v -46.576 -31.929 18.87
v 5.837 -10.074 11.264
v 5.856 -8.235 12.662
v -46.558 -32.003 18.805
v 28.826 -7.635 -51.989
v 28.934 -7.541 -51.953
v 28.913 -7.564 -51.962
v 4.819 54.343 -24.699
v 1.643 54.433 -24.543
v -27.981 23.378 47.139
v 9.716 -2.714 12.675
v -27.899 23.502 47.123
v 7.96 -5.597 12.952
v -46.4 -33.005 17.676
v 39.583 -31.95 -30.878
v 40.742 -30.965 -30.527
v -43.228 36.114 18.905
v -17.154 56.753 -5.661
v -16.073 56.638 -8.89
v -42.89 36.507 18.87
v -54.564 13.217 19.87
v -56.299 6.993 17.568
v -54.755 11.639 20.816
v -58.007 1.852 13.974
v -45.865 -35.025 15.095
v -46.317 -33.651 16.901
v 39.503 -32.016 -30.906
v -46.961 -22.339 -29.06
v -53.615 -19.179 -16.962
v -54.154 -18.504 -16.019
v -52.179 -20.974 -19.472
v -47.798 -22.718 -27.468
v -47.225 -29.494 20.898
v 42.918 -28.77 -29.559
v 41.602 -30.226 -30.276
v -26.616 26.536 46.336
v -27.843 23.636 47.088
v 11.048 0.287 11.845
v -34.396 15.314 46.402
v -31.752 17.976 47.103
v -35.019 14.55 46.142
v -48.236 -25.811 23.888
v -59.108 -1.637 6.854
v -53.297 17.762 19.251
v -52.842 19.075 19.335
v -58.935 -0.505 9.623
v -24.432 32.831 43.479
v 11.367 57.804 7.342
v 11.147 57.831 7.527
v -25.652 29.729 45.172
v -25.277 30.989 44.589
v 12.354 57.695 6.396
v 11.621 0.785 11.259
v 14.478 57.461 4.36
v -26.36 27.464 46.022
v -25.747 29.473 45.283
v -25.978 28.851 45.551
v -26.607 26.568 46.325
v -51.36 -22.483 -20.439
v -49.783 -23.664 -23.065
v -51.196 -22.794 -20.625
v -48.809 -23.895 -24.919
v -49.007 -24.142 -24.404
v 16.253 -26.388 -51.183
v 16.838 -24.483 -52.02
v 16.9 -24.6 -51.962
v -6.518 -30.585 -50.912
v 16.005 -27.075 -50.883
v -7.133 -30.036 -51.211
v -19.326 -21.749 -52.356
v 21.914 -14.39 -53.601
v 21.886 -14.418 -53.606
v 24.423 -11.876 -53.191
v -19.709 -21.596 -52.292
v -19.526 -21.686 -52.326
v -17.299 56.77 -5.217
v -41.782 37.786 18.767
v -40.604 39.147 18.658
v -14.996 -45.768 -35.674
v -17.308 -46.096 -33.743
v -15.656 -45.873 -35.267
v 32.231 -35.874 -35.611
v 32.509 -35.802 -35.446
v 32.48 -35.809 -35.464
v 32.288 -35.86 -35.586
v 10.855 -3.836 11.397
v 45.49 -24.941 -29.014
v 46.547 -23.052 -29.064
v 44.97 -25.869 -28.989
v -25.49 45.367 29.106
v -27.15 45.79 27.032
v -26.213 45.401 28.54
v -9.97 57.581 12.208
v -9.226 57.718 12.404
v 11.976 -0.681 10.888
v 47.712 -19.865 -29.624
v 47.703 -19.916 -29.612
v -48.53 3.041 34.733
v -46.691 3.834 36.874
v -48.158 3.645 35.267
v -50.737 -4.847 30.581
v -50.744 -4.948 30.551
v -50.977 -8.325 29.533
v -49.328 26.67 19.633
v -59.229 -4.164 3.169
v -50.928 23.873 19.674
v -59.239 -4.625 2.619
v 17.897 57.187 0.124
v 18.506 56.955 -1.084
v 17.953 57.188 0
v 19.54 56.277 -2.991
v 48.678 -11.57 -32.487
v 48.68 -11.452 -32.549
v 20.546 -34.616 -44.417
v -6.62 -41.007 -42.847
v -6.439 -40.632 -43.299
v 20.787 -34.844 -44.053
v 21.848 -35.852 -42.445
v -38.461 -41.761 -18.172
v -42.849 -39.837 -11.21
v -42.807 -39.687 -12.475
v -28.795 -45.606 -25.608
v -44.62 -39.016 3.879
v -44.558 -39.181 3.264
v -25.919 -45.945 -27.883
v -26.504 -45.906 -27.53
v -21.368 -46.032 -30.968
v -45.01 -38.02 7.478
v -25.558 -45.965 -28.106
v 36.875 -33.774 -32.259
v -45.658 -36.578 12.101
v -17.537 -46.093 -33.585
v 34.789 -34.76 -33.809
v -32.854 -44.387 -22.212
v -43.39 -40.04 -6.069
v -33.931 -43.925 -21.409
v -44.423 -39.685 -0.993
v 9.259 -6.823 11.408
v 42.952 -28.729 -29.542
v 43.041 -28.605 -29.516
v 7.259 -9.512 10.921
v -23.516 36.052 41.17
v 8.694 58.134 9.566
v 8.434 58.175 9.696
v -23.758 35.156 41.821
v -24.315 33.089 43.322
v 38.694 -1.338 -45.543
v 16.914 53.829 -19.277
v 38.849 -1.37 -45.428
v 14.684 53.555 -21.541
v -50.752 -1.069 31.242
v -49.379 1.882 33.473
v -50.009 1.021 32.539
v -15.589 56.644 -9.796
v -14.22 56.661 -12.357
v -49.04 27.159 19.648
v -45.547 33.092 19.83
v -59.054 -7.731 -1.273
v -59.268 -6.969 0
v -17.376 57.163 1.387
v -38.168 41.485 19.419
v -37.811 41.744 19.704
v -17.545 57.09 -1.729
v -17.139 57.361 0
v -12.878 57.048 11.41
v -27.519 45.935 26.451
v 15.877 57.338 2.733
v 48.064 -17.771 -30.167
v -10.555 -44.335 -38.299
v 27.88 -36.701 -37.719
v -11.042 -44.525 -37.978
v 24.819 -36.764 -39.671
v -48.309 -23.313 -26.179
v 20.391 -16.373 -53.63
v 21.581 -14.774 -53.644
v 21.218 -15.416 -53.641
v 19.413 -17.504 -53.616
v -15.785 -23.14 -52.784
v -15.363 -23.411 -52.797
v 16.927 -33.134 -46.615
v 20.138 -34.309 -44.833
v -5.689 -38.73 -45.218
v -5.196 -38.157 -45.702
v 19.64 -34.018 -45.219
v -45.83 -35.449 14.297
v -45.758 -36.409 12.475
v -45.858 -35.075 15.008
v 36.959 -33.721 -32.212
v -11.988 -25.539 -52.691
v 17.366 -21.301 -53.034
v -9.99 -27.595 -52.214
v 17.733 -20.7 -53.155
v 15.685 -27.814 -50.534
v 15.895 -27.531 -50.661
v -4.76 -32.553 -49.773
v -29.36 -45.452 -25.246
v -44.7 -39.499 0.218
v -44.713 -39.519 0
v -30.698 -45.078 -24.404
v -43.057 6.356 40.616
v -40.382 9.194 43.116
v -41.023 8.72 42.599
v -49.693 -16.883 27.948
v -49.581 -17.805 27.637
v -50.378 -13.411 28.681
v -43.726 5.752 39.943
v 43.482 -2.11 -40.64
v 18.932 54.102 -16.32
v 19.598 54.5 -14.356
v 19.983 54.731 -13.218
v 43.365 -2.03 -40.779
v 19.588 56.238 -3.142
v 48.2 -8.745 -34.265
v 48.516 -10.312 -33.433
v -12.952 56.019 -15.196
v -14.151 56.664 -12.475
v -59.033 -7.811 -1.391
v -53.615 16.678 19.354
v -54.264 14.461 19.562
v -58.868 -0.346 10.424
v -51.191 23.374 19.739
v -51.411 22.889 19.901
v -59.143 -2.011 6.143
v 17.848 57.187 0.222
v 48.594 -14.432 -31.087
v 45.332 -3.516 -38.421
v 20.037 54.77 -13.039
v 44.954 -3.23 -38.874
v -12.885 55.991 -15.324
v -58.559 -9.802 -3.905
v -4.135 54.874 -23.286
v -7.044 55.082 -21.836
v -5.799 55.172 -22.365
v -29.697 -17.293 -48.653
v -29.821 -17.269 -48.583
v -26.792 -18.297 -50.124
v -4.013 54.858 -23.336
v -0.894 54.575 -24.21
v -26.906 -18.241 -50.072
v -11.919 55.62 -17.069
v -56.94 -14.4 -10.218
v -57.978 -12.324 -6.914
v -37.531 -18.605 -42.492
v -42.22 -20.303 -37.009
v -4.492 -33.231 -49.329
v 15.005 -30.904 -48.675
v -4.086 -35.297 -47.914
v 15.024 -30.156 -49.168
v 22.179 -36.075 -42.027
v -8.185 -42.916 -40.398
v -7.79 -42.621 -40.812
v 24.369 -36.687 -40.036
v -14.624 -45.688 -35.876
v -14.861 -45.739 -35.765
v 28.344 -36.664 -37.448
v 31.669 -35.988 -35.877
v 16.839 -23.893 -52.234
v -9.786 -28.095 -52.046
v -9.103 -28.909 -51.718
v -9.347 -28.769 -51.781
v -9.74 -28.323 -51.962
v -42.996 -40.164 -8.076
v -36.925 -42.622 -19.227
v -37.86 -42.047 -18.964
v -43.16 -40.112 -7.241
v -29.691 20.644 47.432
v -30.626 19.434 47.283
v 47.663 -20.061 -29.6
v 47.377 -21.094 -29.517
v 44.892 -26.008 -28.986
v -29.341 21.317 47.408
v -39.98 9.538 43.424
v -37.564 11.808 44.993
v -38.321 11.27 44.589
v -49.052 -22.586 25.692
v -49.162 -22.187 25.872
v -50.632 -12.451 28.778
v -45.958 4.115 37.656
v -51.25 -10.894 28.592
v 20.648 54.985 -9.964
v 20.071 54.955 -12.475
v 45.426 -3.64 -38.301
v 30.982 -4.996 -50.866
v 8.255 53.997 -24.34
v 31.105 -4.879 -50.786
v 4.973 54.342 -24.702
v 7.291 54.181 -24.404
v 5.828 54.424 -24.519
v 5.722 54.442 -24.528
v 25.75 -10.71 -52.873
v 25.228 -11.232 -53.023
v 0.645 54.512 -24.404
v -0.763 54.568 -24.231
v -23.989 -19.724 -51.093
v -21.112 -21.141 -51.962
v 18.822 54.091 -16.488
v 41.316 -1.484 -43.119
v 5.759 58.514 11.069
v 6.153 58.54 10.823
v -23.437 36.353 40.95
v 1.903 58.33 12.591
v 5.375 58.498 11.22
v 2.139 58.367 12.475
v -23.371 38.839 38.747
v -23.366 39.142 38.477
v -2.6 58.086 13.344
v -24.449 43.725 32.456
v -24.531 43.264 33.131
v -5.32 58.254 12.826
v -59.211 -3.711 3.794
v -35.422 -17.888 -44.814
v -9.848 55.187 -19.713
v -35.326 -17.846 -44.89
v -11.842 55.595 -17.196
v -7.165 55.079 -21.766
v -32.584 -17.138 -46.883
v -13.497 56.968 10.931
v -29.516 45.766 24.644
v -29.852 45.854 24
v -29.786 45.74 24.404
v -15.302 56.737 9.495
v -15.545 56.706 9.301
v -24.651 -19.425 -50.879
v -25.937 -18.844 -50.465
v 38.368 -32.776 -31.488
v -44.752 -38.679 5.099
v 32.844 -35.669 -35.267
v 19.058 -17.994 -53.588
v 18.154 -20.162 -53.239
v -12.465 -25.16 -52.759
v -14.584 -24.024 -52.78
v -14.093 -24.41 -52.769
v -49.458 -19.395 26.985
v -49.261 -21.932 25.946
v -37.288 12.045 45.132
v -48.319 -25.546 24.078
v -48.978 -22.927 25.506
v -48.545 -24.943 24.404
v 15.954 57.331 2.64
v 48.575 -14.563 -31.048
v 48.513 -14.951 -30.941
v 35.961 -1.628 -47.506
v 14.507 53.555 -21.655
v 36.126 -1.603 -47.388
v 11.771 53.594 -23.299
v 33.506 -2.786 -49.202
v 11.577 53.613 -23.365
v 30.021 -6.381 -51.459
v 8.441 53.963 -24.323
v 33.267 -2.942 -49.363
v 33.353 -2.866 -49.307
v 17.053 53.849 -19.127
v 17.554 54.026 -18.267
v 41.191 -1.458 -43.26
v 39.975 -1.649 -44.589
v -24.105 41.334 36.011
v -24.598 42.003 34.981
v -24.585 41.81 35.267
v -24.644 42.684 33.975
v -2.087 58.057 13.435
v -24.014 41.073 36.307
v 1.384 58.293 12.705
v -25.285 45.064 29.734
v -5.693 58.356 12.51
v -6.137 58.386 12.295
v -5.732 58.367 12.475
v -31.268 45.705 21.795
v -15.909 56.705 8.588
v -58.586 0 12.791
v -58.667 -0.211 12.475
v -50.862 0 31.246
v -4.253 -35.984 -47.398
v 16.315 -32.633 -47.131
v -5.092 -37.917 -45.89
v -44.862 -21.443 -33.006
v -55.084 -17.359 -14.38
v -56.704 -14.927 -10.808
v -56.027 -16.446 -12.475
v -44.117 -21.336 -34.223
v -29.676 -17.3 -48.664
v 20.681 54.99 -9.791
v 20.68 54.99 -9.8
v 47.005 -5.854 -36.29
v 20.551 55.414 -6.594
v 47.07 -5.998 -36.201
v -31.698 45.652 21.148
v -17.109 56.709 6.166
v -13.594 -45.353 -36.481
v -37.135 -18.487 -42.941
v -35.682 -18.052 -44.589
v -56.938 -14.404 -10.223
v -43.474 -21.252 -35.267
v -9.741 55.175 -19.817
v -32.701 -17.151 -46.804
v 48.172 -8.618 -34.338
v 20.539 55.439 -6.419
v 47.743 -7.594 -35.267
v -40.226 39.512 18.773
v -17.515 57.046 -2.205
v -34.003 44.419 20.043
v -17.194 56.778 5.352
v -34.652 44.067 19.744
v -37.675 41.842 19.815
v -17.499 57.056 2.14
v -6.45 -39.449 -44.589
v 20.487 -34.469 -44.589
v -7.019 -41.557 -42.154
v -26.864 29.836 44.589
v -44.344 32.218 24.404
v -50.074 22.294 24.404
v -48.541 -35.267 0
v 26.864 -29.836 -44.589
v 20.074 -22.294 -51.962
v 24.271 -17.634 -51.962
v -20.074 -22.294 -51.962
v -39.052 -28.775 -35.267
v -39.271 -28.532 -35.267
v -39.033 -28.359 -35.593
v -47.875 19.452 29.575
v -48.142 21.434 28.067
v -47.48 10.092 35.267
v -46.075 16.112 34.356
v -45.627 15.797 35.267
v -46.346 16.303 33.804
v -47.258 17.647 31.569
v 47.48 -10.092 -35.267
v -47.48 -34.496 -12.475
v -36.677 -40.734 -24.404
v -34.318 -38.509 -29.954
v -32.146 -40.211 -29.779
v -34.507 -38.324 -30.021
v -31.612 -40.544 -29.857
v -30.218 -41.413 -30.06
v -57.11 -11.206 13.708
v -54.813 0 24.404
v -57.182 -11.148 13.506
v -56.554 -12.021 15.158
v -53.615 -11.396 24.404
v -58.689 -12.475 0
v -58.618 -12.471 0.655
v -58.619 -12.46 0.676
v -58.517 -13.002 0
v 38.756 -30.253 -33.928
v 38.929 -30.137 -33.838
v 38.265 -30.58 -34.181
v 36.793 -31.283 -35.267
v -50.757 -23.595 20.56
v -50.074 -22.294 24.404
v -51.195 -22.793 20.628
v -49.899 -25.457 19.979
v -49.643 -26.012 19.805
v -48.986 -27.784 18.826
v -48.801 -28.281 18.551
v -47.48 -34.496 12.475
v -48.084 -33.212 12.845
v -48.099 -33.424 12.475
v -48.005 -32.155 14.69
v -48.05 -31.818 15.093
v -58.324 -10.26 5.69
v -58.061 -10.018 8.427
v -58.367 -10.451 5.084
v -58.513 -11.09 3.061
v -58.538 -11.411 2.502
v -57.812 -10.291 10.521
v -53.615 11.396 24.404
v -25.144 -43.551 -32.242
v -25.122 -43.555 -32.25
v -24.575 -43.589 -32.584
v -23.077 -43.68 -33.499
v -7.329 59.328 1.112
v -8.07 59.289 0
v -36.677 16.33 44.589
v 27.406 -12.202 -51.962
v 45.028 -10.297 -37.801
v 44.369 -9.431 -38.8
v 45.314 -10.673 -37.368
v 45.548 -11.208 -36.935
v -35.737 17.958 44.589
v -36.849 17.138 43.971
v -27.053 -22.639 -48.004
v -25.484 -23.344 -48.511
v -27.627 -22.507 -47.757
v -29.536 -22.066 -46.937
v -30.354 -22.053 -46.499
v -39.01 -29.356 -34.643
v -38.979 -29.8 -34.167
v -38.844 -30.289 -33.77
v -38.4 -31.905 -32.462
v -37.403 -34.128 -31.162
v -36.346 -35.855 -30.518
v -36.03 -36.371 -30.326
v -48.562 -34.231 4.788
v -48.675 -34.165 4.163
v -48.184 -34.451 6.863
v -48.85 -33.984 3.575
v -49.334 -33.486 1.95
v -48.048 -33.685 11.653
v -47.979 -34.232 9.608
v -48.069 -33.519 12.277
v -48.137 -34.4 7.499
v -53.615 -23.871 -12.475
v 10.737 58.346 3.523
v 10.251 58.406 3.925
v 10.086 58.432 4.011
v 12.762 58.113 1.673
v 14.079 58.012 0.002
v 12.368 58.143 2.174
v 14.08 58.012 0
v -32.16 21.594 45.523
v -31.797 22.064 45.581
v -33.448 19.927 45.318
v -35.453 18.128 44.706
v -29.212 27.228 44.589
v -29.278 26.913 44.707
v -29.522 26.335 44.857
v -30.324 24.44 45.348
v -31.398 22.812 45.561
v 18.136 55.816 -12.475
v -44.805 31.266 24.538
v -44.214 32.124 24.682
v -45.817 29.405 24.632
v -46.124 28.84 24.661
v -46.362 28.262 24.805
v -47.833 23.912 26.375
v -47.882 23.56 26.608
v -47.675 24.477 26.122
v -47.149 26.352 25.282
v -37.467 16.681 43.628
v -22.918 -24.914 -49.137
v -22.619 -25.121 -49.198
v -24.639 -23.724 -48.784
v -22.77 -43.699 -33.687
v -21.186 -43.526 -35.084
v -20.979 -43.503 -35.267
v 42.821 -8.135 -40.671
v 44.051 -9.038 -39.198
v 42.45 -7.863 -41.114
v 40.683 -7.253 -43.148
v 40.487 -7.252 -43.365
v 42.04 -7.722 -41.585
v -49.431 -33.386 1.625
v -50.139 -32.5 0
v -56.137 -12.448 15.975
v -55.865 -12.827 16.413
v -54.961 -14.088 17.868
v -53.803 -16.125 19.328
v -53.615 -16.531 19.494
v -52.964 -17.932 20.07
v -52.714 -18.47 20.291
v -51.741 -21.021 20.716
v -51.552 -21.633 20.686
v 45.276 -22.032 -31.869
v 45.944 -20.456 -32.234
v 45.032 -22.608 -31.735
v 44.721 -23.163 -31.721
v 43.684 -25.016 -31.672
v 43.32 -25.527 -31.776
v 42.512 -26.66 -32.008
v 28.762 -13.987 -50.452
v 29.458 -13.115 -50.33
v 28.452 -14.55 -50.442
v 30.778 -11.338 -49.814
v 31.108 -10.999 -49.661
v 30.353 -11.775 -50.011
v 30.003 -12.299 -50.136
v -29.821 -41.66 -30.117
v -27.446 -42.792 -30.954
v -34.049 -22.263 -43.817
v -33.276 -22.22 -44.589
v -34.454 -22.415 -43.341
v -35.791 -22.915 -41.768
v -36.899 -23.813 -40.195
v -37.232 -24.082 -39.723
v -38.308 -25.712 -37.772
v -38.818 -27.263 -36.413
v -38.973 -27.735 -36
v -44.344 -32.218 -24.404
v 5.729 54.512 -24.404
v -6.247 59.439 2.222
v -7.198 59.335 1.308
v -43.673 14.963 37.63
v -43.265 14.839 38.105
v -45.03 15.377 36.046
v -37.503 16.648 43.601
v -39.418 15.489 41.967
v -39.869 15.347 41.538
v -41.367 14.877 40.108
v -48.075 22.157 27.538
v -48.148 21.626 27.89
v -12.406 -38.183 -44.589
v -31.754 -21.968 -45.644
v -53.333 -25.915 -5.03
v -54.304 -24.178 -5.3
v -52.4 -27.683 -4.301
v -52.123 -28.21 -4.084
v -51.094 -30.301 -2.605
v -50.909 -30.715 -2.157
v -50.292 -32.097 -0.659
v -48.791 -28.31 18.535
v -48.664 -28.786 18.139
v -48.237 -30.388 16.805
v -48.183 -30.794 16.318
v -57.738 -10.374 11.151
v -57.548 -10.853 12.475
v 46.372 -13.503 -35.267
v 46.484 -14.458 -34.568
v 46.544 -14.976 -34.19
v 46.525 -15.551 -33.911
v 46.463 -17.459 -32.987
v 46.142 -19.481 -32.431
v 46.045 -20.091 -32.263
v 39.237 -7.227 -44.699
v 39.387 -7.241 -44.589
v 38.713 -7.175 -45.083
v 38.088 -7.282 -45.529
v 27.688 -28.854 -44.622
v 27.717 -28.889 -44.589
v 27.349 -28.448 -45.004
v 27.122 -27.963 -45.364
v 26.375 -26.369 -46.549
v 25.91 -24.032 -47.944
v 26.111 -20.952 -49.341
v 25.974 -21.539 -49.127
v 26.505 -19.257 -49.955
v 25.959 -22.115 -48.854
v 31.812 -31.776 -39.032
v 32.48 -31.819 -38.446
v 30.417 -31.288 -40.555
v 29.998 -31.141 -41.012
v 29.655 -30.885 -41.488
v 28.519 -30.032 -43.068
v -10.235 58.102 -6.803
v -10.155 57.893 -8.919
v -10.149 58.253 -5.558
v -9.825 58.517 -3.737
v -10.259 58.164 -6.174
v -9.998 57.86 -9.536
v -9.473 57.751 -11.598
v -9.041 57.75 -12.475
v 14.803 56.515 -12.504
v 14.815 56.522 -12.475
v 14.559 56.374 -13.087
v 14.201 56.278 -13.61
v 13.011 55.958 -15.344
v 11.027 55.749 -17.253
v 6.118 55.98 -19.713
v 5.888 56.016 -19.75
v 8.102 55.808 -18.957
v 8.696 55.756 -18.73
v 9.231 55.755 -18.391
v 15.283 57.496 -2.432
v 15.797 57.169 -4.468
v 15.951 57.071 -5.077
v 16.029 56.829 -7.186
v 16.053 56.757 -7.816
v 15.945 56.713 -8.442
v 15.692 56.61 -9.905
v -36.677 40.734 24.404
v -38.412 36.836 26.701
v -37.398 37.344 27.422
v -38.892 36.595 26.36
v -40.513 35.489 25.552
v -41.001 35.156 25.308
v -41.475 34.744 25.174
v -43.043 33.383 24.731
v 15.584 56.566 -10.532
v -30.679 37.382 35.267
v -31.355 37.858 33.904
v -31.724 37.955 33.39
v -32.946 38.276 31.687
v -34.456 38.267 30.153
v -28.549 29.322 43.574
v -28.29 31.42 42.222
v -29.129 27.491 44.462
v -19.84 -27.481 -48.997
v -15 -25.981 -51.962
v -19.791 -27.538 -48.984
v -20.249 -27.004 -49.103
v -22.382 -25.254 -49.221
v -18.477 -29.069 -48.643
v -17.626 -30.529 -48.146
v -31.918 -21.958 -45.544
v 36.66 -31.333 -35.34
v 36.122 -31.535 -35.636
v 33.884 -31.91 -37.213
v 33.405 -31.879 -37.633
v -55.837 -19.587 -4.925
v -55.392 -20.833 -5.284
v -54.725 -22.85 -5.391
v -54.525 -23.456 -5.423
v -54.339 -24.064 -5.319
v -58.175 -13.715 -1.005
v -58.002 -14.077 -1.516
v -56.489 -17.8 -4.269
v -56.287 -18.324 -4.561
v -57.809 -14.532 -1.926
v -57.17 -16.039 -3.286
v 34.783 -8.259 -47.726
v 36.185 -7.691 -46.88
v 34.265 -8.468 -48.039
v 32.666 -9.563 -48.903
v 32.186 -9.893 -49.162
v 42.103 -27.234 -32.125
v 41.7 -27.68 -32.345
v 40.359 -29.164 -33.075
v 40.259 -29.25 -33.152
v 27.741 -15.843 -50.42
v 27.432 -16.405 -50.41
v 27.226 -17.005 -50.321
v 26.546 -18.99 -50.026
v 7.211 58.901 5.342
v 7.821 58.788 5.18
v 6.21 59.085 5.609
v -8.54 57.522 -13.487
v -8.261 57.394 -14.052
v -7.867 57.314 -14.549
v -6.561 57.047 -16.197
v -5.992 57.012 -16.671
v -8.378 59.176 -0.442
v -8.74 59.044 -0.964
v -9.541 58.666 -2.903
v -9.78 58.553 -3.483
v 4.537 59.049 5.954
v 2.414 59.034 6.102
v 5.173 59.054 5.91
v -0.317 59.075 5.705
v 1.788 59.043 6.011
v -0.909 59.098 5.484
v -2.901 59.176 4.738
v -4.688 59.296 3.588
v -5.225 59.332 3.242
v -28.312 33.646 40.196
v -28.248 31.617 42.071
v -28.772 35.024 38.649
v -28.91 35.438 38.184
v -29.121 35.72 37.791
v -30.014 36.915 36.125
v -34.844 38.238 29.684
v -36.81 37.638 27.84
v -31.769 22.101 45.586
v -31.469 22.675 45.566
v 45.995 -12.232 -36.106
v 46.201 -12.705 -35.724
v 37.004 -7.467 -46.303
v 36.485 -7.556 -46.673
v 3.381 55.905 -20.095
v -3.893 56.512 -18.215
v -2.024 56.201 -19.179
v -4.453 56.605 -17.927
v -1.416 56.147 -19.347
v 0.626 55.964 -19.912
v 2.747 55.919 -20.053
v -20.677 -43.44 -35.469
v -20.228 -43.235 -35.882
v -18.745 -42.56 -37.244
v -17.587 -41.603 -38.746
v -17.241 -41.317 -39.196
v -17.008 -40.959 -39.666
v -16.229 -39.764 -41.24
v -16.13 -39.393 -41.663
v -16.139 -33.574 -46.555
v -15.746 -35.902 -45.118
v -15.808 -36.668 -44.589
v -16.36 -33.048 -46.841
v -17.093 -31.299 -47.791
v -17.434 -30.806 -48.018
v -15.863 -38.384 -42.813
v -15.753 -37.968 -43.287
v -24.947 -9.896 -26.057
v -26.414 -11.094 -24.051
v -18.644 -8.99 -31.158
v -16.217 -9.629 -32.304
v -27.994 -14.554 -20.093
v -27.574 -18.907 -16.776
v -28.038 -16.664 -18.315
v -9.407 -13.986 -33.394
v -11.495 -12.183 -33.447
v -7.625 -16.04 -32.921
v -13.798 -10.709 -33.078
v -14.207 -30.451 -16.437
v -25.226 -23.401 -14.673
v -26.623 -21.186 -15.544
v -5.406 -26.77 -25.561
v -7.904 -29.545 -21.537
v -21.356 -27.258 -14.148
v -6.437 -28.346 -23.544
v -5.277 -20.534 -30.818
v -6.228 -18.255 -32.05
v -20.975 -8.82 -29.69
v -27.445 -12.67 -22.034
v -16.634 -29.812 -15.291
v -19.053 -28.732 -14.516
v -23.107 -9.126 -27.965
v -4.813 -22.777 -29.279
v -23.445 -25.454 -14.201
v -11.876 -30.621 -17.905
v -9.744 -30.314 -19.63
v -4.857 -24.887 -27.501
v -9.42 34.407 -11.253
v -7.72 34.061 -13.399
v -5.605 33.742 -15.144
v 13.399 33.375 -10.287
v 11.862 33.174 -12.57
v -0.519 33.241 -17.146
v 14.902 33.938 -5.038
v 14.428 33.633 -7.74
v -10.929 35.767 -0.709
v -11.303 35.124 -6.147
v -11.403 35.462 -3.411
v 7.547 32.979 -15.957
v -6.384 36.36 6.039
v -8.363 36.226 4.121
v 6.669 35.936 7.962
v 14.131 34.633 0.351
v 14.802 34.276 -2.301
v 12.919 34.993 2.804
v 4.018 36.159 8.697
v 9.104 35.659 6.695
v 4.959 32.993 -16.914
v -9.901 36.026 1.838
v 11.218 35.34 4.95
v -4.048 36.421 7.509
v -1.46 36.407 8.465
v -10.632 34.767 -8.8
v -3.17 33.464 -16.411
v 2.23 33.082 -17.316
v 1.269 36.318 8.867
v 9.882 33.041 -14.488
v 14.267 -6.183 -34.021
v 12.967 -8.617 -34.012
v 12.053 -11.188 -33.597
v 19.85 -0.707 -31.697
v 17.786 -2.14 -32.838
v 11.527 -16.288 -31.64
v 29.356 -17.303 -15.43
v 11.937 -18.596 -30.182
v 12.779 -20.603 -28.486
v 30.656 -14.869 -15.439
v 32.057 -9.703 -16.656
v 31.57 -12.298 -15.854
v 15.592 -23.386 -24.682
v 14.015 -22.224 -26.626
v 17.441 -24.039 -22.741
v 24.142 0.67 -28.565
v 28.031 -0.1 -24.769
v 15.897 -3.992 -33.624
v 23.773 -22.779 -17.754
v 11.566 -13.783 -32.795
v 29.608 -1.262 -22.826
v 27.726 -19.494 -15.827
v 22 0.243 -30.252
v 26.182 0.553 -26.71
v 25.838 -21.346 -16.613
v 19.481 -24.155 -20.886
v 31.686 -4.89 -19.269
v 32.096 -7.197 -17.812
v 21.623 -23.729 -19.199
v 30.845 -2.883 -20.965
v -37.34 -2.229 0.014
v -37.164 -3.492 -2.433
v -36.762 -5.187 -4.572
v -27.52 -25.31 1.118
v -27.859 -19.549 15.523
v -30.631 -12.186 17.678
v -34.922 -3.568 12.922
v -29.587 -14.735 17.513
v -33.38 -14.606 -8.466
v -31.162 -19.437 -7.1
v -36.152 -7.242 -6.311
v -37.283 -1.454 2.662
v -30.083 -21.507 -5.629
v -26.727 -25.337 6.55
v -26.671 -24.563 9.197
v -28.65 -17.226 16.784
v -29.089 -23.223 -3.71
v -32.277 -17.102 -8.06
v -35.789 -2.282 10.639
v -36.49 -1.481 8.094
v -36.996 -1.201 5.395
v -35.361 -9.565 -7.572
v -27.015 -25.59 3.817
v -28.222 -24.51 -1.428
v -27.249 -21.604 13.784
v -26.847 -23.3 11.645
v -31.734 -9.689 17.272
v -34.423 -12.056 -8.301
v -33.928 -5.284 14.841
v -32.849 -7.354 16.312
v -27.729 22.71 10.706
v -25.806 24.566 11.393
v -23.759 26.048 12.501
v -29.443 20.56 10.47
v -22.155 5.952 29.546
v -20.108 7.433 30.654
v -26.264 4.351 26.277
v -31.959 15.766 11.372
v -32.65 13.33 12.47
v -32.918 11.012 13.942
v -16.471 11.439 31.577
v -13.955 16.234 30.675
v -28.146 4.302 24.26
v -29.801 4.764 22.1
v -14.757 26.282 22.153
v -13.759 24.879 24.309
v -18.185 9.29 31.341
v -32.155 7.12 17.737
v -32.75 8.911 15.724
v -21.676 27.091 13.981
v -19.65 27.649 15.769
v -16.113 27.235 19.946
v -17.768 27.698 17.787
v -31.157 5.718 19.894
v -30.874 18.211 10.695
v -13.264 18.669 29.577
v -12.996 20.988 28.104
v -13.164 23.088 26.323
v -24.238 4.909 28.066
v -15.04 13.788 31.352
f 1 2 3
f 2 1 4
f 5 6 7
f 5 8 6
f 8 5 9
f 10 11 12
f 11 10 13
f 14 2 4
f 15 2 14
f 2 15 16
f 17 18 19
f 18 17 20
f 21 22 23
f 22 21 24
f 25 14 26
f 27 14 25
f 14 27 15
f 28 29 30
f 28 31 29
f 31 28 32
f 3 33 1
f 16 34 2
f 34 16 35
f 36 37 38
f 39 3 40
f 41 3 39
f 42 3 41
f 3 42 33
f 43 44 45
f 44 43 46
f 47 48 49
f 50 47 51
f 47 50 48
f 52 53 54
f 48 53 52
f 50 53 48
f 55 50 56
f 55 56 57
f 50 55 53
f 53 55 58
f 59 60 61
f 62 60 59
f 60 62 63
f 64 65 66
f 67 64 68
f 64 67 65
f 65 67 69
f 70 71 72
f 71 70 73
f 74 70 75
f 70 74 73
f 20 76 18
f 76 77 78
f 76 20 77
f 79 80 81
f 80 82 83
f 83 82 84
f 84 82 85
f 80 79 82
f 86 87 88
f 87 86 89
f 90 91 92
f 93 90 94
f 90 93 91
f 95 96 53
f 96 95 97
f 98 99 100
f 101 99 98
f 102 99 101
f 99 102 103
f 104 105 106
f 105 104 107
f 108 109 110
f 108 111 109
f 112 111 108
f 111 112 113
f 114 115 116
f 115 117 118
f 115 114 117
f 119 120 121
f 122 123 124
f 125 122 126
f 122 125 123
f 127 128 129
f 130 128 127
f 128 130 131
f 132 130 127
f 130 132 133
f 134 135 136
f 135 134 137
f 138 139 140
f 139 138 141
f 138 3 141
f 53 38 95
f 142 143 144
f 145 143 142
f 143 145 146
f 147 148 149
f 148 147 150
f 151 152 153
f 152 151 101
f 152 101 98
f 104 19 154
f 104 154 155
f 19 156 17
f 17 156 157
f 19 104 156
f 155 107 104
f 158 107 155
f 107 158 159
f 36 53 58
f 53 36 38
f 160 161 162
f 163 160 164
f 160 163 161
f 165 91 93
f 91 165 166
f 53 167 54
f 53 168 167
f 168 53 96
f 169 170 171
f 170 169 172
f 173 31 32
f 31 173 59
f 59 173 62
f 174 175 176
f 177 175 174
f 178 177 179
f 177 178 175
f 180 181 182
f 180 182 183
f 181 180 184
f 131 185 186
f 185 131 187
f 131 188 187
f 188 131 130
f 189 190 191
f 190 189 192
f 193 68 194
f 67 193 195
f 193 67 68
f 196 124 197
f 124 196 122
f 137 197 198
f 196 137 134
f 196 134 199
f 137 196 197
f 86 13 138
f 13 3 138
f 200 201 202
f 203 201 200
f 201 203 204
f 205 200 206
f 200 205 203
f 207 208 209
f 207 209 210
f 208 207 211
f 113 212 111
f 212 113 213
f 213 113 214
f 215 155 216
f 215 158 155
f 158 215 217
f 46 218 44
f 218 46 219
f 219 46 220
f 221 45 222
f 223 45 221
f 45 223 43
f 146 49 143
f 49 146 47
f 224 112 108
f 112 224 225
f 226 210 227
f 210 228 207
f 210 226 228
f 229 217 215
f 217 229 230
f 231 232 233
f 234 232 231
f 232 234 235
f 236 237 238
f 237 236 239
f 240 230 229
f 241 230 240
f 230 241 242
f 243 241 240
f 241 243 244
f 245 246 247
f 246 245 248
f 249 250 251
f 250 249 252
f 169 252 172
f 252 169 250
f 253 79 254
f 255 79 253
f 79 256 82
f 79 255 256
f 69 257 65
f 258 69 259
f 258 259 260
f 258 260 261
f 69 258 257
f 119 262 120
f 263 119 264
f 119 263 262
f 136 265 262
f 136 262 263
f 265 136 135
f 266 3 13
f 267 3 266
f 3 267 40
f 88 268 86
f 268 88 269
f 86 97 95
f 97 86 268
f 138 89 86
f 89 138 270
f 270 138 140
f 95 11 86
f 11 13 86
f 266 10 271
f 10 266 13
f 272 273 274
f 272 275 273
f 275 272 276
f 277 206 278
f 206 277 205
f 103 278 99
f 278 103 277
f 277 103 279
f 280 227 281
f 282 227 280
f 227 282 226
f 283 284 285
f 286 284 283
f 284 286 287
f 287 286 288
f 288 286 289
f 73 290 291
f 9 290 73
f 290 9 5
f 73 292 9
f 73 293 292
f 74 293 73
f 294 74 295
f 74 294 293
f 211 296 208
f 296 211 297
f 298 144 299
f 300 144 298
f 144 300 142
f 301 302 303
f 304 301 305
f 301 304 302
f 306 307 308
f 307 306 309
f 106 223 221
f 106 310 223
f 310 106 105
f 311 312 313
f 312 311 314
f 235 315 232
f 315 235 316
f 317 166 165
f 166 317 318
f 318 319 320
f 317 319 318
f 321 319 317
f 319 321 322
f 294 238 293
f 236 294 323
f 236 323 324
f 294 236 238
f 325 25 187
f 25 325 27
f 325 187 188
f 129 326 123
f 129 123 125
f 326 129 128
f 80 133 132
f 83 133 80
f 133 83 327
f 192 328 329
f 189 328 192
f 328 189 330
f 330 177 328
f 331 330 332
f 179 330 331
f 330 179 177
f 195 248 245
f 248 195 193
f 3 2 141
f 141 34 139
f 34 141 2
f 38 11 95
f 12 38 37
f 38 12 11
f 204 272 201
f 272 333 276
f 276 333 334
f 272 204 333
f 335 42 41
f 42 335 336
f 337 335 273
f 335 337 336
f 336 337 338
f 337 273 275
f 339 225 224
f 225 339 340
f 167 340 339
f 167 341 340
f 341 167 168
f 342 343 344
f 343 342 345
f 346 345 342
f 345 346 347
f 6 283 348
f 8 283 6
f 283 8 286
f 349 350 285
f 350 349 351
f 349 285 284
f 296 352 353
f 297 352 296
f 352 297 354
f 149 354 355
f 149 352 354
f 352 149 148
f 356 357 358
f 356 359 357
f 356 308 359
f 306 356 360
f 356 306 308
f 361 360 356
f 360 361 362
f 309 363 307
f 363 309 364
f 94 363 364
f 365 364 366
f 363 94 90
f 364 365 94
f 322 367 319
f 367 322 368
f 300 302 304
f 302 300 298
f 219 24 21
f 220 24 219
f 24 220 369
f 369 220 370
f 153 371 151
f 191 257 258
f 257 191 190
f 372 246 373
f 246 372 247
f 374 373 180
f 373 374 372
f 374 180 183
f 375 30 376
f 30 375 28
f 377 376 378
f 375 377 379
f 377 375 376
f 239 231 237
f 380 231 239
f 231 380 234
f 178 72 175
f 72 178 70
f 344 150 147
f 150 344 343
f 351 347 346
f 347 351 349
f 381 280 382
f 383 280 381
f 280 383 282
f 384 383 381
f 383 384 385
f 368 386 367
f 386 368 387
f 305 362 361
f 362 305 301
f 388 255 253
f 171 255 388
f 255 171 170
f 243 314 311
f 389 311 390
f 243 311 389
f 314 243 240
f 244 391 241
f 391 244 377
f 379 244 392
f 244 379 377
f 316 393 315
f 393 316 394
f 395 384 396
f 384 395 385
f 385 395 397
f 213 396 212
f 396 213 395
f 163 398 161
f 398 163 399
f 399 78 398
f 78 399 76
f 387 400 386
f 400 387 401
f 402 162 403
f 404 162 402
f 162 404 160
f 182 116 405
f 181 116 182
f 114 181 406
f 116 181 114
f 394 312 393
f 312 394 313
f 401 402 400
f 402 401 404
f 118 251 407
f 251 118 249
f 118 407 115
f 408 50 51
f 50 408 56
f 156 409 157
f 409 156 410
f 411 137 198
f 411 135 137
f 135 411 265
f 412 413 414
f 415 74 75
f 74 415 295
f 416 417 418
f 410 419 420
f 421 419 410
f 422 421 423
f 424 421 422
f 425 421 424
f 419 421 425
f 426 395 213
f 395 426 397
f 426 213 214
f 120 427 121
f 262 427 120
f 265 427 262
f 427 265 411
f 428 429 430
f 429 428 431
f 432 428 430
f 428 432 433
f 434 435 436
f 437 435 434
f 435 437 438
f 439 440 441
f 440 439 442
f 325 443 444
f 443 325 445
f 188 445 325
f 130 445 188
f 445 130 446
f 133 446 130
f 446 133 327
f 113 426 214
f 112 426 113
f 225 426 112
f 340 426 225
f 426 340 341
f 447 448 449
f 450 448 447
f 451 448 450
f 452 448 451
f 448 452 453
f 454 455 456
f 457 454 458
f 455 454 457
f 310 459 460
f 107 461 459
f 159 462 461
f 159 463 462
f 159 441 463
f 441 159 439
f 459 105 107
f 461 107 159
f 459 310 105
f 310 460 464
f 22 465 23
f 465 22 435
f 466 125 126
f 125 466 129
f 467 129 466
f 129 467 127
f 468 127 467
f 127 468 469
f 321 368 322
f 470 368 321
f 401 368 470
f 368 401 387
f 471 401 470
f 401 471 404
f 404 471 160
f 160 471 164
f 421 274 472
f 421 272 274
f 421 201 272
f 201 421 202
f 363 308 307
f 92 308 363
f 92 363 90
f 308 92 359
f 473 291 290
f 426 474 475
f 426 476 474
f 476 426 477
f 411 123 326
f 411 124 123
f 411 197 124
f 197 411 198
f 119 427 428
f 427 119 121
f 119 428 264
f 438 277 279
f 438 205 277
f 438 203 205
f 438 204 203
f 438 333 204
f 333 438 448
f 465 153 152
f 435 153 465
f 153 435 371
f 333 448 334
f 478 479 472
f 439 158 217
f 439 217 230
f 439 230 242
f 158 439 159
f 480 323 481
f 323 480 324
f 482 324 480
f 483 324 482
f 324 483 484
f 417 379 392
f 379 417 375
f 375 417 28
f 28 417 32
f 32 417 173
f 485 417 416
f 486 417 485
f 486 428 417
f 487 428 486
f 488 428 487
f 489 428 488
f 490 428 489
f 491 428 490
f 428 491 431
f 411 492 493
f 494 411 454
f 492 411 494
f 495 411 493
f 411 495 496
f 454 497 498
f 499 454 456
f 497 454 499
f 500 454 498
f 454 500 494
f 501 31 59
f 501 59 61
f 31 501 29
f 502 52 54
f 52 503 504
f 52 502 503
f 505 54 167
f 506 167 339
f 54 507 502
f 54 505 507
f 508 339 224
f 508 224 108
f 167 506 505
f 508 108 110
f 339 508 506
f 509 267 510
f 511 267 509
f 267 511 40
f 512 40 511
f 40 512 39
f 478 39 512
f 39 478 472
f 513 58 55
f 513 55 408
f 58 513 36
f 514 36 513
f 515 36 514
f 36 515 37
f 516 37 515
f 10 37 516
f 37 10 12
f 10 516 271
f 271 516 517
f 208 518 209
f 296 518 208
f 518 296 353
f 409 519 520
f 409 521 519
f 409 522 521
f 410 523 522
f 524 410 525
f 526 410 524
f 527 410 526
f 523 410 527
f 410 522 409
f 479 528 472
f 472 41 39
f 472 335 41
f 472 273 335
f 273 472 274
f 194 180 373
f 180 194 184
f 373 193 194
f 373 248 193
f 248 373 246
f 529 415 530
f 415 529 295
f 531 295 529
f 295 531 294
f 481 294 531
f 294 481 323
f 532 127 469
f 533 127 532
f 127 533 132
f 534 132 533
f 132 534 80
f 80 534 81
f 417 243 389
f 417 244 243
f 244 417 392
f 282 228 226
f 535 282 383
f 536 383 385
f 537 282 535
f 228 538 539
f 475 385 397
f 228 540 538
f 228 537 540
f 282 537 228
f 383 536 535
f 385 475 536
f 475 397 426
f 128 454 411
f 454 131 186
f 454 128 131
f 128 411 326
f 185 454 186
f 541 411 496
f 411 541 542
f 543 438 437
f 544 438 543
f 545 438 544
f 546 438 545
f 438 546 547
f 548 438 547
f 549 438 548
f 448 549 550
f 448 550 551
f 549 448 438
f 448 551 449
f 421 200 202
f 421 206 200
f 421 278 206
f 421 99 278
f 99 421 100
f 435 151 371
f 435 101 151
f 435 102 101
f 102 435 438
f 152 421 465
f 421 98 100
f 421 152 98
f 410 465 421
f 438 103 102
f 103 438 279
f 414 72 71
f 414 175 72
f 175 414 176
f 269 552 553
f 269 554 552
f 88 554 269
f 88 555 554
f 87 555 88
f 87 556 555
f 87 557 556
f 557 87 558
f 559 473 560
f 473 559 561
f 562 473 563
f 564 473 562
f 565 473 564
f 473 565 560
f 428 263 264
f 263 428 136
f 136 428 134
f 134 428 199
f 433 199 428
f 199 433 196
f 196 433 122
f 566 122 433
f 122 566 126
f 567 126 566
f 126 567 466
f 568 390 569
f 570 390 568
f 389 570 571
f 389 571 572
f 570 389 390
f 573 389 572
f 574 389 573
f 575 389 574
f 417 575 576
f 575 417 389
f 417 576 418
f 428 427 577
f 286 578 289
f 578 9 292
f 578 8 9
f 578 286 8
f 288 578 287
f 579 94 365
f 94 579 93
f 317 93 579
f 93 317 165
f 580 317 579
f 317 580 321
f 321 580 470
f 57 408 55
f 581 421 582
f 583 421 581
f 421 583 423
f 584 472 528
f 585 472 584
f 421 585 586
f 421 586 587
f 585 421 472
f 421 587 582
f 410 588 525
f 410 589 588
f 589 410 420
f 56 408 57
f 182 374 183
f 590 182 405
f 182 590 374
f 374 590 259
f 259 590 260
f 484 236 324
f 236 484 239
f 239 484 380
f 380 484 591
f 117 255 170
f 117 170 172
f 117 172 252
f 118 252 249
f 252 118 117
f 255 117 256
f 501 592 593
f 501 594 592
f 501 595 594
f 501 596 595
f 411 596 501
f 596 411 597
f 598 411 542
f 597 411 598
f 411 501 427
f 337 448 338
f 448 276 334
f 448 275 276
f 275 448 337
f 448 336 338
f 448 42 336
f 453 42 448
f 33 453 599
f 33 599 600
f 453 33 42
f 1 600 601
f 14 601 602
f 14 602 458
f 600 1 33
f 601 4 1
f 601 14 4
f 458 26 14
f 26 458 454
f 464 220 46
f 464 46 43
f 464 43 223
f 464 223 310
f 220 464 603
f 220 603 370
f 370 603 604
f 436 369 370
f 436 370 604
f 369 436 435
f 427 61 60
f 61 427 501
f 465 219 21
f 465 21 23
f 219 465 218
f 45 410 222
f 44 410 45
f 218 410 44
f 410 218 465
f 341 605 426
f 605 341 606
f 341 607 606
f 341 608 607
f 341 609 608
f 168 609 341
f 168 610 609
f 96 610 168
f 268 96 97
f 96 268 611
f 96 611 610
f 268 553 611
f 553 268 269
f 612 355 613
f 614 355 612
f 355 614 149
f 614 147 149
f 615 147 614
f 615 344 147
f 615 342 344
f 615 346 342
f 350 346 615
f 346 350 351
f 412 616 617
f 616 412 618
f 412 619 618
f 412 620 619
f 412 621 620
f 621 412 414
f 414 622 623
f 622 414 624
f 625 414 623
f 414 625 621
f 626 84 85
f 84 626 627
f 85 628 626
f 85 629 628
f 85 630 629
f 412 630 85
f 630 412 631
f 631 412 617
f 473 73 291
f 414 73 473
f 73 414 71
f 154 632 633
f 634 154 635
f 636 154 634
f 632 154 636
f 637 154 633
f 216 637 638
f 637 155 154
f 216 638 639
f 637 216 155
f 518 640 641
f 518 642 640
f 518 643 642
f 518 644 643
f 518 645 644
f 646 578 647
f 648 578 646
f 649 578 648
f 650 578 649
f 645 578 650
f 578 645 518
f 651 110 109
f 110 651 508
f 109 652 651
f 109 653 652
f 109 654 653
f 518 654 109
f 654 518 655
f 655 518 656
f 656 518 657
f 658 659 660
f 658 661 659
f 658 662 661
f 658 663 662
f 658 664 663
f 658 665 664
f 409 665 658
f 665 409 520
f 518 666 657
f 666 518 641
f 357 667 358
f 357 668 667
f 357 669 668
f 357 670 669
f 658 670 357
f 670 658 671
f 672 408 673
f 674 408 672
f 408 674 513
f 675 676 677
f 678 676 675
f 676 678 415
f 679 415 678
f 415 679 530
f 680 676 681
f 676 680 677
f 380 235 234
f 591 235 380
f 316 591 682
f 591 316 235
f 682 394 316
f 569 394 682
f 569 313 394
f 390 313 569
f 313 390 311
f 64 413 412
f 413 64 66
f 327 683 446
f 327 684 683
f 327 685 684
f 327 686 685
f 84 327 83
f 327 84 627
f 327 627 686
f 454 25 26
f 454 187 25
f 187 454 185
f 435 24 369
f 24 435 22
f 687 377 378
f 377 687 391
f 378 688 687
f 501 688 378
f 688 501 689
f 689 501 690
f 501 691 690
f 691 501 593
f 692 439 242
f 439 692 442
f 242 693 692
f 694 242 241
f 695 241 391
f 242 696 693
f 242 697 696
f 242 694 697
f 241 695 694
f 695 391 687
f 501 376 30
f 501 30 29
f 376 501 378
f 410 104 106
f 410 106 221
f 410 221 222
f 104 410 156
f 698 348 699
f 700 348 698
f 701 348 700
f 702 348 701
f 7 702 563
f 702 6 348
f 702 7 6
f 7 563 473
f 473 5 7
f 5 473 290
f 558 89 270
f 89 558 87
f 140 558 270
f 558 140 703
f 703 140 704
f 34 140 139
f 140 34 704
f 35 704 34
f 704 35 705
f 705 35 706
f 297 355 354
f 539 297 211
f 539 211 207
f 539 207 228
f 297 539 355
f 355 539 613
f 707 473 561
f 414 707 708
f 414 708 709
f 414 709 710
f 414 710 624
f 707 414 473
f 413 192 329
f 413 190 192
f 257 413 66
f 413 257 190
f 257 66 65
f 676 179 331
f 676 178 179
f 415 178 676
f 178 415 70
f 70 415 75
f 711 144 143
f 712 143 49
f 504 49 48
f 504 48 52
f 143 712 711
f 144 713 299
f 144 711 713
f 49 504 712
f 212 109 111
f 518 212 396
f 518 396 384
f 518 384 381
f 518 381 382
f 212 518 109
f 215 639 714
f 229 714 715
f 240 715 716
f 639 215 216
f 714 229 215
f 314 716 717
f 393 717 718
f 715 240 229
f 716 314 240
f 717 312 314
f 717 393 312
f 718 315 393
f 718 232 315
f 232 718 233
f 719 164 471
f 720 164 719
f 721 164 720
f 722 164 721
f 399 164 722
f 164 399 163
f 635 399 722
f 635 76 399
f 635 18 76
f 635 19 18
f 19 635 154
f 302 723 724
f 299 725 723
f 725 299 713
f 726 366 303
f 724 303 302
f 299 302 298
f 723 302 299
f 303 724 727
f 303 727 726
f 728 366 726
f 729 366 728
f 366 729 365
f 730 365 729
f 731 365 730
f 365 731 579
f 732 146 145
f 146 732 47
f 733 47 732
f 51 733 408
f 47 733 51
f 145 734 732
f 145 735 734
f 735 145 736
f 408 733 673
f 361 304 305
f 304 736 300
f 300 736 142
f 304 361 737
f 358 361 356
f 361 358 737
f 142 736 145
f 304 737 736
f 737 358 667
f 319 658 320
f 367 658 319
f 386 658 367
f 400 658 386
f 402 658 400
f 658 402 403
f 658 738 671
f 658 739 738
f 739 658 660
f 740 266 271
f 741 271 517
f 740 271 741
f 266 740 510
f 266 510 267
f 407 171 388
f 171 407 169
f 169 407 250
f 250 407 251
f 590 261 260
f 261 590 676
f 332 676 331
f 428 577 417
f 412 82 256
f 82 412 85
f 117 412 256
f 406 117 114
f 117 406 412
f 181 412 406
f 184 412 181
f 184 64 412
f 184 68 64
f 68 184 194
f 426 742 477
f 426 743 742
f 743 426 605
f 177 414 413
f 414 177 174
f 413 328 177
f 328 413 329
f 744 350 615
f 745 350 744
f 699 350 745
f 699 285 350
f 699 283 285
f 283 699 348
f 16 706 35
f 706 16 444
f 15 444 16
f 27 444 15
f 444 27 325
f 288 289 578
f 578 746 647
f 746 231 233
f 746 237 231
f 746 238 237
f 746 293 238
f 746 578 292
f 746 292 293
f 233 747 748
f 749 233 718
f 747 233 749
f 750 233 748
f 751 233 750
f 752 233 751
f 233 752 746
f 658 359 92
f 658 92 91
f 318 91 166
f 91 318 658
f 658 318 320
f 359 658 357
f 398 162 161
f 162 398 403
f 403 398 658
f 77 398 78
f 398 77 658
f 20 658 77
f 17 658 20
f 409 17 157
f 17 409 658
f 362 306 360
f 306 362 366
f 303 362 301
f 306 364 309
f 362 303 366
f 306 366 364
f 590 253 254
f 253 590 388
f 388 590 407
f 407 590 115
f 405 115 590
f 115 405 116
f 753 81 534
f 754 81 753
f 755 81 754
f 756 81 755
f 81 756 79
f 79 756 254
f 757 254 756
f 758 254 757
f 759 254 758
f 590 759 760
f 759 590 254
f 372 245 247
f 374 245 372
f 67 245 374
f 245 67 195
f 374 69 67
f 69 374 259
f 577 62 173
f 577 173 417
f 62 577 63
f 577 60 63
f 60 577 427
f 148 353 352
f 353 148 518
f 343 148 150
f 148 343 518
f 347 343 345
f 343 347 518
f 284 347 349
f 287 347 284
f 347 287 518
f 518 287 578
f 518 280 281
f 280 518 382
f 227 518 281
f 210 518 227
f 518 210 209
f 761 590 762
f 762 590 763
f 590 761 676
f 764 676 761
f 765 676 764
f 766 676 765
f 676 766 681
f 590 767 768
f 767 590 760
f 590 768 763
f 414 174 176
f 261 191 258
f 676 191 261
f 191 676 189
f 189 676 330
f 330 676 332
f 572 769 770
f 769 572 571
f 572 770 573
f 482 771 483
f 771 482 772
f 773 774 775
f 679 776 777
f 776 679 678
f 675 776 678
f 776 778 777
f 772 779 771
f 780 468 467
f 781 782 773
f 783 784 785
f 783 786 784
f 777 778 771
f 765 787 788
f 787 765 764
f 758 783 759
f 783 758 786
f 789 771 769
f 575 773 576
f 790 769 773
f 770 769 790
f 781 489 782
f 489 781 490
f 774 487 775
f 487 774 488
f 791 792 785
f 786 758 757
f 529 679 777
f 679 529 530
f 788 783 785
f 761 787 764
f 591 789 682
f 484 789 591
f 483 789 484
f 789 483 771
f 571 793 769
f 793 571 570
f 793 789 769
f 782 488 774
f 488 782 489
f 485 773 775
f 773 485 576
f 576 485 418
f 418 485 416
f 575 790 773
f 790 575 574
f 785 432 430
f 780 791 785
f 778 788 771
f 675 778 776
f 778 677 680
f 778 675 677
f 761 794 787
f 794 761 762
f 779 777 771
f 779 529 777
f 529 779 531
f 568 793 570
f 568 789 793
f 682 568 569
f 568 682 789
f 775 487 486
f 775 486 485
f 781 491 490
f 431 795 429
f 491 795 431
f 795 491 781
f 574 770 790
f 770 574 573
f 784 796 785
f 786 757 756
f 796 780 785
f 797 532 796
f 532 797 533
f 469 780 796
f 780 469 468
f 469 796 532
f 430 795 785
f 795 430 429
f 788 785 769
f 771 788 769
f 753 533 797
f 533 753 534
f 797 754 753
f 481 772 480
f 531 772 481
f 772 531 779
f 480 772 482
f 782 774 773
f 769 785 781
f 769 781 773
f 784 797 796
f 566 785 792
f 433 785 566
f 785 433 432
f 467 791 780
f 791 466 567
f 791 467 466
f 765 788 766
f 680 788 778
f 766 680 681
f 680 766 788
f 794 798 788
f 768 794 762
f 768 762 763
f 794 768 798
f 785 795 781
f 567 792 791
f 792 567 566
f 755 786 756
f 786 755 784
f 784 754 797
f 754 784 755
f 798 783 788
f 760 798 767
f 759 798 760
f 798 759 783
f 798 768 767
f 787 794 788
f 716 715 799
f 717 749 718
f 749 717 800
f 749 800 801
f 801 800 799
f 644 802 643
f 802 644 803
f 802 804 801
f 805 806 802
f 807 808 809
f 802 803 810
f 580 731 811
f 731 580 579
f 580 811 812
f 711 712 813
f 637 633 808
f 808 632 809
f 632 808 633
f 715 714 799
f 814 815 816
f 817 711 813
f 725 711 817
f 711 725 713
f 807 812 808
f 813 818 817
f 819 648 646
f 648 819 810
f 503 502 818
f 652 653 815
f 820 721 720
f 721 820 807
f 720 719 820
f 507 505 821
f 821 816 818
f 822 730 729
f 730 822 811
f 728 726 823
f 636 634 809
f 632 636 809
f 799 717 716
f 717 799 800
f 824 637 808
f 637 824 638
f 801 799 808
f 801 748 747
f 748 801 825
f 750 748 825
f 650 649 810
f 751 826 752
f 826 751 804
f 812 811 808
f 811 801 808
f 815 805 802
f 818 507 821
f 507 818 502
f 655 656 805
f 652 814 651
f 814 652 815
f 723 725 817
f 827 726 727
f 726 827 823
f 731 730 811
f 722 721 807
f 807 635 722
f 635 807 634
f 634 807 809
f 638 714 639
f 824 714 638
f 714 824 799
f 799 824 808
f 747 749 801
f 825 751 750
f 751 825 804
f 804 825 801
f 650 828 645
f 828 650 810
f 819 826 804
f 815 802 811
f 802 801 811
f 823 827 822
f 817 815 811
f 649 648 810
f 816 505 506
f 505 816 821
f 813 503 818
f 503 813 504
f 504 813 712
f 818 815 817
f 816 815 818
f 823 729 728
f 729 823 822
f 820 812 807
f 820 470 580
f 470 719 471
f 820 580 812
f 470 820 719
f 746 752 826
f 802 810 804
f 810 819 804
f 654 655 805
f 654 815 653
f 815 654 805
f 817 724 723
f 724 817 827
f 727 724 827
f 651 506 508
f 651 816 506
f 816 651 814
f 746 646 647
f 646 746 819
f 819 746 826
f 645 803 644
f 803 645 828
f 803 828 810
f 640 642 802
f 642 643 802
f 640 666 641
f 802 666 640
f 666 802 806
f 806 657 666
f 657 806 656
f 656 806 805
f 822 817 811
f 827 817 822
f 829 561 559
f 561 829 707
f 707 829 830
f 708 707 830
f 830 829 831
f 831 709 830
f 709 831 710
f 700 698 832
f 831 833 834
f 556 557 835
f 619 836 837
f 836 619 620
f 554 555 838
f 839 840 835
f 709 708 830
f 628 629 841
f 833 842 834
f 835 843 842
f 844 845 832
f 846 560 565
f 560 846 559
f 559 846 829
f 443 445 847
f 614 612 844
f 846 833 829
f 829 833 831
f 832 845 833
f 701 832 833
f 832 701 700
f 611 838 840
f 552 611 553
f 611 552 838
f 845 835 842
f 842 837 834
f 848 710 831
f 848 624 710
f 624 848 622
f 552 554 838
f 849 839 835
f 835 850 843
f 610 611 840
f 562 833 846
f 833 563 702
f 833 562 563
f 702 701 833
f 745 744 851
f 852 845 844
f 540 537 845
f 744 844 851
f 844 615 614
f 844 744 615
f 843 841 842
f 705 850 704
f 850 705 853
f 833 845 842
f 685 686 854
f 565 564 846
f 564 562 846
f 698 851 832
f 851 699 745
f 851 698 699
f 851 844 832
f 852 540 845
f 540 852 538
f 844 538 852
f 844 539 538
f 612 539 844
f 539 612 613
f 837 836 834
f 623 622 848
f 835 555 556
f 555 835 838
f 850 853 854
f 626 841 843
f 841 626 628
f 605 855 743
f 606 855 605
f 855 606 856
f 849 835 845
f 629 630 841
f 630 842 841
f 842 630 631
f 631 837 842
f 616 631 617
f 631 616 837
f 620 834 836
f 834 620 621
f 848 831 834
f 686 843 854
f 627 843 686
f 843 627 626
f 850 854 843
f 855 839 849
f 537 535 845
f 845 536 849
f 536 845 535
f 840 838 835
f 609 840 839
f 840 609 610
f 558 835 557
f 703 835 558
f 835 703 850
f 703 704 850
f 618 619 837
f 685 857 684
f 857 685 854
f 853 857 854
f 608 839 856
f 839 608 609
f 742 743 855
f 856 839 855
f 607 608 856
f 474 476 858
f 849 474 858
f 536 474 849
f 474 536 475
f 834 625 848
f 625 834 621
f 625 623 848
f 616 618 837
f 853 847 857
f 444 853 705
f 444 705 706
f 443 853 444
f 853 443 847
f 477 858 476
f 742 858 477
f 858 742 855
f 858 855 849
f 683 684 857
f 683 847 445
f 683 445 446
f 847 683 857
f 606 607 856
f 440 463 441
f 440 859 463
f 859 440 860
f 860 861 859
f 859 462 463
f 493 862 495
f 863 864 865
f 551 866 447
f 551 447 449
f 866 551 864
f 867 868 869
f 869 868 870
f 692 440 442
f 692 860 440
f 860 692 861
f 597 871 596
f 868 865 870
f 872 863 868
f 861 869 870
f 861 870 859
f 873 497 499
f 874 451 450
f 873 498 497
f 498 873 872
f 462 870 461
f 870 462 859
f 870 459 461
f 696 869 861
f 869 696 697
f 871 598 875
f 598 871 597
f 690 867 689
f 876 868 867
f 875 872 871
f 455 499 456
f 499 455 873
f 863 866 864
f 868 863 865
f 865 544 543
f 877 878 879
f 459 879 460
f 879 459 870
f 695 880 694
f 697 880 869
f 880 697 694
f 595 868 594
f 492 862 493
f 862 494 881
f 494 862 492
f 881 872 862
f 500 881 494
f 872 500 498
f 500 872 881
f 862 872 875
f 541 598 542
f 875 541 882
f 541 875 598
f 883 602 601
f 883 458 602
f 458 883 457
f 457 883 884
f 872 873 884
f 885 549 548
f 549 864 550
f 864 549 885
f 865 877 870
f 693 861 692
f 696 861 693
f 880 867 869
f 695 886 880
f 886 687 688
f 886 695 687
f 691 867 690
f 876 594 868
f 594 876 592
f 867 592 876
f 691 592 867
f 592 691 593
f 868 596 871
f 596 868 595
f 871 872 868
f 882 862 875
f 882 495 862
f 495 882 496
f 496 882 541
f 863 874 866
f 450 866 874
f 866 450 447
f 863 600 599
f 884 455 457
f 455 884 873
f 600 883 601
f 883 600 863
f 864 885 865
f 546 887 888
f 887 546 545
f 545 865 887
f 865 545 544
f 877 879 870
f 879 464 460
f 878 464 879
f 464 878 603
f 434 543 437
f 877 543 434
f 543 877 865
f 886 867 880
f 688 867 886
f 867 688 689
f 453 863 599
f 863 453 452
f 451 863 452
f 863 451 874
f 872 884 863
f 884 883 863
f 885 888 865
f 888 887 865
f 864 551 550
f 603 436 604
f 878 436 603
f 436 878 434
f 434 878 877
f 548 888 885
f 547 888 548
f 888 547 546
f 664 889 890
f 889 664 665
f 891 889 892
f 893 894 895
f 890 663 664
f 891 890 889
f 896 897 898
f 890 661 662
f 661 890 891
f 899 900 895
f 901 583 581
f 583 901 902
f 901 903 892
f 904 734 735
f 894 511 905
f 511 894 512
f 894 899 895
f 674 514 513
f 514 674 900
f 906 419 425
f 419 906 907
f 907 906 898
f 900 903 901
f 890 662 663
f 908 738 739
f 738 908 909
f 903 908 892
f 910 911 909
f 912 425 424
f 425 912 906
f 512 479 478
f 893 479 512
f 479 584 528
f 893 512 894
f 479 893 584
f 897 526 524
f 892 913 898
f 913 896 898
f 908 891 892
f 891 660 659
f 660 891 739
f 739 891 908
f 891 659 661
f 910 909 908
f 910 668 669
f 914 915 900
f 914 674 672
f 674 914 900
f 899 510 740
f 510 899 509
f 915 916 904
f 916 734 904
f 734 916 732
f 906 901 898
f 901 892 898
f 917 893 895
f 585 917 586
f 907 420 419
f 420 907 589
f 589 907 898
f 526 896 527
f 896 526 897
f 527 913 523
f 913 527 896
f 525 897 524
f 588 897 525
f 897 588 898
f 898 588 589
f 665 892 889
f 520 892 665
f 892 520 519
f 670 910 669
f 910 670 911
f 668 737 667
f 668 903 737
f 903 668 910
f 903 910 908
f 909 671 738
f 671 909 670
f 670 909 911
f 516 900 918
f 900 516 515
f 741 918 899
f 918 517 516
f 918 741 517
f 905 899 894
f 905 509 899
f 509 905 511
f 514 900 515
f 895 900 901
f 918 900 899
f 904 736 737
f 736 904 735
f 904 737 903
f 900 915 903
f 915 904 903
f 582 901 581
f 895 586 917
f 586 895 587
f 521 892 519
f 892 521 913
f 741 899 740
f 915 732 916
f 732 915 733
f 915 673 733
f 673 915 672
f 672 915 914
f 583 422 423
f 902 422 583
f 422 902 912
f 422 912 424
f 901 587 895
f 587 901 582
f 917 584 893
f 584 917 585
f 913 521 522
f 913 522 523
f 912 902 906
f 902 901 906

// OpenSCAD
difference() {
	intersection() {
		hull() {
			rotate(a = -120.3141209556, v = [-0.1046496734, -0.8569046481, 0.0000000000]) {
				rotate(a = -90.0000000000, v = [-0.7071067812, -0.7071067812, 0.0000000000]) {
					cylinder(h = 60, r = 16.2000000000);
				}
			}
			rotate(a = -120.3141209556, v = [-0.1046496734, -0.8569046481, 0.0000000000]) {
				rotate(a = -90.0000000000, v = [0.9659258263, -0.2588190451, 0.0000000000]) {
					cylinder(h = 60, r = 16.2000000000);
				}
			}
			rotate(a = -120.3141209556, v = [-0.1046496734, -0.8569046481, 0.0000000000]) {
				rotate(a = -22.2263282801, v = [-0.2891837505, -0.2438402662, 0.0000000000]) {
					cylinder(h = 60, r = 16.2000000000);
				}
			}
			rotate(a = -120.3141209556, v = [-0.1046496734, -0.8569046481, 0.0000000000]) {
				rotate(a = -144.0917087294, v = [-0.5260711787, -0.2592665282, 0.0000000000]) {
					cylinder(h = 60, r = 16.2000000000);
				}
			}
			rotate(a = -120.3141209556, v = [-0.1046496734, -0.8569046481, 0.0000000000]) {
				rotate(a = -155.9342565737, v = [0.3911208660, 0.1153809290, -0.0000000000]) {
					cylinder(h = 60, r = 16.2000000000);
				}
			}
		}
		sphere(r = 60);
	}
	union() {
		rotate(a = -120.3141209556, v = [-0.1046496734, -0.8569046481, 0.0000000000]) {
			rotate(a = -90.0000000000, v = [-0.7071067812, -0.7071067812, 0.0000000000]) {
				translate(v = [0, 0, 35]) {
					cylinder(h = 100, r = 13.2000000000);
				}
			}
		}
		rotate(a = -120.3141209556, v = [-0.1046496734, -0.8569046481, 0.0000000000]) {
			rotate(a = -90.0000000000, v = [0.9659258263, -0.2588190451, 0.0000000000]) {
				translate(v = [0, 0, 35]) {
					cylinder(h = 100, r = 13.2000000000);
				}
			}
		}
		rotate(a = -120.3141209556, v = [-0.1046496734, -0.8569046481, 0.0000000000]) {
			rotate(a = -22.2263282801, v = [-0.2891837505, -0.2438402662, 0.0000000000]) {
				translate(v = [0, 0, 35]) {
					cylinder(h = 100, r = 13.2000000000);
				}
			}
		}
		rotate(a = -120.3141209556, v = [-0.1046496734, -0.8569046481, 0.0000000000]) {
			rotate(a = -144.0917087294, v = [-0.5260711787, -0.2592665282, 0.0000000000]) {
				translate(v = [0, 0, 35]) {
					cylinder(h = 100, r = 13.2000000000);
				}
			}
		}
		rotate(a = -120.3141209556, v = [-0.1046496734, -0.8569046481, 0.0000000000]) {
			rotate(a = -155.9342565737, v = [0.3911208660, 0.1153809290, -0.0000000000]) {
				translate(v = [0, 0, 35]) {
					cylinder(h = 100, r = 13.2000000000);
				}
			}
		}
	}
}
